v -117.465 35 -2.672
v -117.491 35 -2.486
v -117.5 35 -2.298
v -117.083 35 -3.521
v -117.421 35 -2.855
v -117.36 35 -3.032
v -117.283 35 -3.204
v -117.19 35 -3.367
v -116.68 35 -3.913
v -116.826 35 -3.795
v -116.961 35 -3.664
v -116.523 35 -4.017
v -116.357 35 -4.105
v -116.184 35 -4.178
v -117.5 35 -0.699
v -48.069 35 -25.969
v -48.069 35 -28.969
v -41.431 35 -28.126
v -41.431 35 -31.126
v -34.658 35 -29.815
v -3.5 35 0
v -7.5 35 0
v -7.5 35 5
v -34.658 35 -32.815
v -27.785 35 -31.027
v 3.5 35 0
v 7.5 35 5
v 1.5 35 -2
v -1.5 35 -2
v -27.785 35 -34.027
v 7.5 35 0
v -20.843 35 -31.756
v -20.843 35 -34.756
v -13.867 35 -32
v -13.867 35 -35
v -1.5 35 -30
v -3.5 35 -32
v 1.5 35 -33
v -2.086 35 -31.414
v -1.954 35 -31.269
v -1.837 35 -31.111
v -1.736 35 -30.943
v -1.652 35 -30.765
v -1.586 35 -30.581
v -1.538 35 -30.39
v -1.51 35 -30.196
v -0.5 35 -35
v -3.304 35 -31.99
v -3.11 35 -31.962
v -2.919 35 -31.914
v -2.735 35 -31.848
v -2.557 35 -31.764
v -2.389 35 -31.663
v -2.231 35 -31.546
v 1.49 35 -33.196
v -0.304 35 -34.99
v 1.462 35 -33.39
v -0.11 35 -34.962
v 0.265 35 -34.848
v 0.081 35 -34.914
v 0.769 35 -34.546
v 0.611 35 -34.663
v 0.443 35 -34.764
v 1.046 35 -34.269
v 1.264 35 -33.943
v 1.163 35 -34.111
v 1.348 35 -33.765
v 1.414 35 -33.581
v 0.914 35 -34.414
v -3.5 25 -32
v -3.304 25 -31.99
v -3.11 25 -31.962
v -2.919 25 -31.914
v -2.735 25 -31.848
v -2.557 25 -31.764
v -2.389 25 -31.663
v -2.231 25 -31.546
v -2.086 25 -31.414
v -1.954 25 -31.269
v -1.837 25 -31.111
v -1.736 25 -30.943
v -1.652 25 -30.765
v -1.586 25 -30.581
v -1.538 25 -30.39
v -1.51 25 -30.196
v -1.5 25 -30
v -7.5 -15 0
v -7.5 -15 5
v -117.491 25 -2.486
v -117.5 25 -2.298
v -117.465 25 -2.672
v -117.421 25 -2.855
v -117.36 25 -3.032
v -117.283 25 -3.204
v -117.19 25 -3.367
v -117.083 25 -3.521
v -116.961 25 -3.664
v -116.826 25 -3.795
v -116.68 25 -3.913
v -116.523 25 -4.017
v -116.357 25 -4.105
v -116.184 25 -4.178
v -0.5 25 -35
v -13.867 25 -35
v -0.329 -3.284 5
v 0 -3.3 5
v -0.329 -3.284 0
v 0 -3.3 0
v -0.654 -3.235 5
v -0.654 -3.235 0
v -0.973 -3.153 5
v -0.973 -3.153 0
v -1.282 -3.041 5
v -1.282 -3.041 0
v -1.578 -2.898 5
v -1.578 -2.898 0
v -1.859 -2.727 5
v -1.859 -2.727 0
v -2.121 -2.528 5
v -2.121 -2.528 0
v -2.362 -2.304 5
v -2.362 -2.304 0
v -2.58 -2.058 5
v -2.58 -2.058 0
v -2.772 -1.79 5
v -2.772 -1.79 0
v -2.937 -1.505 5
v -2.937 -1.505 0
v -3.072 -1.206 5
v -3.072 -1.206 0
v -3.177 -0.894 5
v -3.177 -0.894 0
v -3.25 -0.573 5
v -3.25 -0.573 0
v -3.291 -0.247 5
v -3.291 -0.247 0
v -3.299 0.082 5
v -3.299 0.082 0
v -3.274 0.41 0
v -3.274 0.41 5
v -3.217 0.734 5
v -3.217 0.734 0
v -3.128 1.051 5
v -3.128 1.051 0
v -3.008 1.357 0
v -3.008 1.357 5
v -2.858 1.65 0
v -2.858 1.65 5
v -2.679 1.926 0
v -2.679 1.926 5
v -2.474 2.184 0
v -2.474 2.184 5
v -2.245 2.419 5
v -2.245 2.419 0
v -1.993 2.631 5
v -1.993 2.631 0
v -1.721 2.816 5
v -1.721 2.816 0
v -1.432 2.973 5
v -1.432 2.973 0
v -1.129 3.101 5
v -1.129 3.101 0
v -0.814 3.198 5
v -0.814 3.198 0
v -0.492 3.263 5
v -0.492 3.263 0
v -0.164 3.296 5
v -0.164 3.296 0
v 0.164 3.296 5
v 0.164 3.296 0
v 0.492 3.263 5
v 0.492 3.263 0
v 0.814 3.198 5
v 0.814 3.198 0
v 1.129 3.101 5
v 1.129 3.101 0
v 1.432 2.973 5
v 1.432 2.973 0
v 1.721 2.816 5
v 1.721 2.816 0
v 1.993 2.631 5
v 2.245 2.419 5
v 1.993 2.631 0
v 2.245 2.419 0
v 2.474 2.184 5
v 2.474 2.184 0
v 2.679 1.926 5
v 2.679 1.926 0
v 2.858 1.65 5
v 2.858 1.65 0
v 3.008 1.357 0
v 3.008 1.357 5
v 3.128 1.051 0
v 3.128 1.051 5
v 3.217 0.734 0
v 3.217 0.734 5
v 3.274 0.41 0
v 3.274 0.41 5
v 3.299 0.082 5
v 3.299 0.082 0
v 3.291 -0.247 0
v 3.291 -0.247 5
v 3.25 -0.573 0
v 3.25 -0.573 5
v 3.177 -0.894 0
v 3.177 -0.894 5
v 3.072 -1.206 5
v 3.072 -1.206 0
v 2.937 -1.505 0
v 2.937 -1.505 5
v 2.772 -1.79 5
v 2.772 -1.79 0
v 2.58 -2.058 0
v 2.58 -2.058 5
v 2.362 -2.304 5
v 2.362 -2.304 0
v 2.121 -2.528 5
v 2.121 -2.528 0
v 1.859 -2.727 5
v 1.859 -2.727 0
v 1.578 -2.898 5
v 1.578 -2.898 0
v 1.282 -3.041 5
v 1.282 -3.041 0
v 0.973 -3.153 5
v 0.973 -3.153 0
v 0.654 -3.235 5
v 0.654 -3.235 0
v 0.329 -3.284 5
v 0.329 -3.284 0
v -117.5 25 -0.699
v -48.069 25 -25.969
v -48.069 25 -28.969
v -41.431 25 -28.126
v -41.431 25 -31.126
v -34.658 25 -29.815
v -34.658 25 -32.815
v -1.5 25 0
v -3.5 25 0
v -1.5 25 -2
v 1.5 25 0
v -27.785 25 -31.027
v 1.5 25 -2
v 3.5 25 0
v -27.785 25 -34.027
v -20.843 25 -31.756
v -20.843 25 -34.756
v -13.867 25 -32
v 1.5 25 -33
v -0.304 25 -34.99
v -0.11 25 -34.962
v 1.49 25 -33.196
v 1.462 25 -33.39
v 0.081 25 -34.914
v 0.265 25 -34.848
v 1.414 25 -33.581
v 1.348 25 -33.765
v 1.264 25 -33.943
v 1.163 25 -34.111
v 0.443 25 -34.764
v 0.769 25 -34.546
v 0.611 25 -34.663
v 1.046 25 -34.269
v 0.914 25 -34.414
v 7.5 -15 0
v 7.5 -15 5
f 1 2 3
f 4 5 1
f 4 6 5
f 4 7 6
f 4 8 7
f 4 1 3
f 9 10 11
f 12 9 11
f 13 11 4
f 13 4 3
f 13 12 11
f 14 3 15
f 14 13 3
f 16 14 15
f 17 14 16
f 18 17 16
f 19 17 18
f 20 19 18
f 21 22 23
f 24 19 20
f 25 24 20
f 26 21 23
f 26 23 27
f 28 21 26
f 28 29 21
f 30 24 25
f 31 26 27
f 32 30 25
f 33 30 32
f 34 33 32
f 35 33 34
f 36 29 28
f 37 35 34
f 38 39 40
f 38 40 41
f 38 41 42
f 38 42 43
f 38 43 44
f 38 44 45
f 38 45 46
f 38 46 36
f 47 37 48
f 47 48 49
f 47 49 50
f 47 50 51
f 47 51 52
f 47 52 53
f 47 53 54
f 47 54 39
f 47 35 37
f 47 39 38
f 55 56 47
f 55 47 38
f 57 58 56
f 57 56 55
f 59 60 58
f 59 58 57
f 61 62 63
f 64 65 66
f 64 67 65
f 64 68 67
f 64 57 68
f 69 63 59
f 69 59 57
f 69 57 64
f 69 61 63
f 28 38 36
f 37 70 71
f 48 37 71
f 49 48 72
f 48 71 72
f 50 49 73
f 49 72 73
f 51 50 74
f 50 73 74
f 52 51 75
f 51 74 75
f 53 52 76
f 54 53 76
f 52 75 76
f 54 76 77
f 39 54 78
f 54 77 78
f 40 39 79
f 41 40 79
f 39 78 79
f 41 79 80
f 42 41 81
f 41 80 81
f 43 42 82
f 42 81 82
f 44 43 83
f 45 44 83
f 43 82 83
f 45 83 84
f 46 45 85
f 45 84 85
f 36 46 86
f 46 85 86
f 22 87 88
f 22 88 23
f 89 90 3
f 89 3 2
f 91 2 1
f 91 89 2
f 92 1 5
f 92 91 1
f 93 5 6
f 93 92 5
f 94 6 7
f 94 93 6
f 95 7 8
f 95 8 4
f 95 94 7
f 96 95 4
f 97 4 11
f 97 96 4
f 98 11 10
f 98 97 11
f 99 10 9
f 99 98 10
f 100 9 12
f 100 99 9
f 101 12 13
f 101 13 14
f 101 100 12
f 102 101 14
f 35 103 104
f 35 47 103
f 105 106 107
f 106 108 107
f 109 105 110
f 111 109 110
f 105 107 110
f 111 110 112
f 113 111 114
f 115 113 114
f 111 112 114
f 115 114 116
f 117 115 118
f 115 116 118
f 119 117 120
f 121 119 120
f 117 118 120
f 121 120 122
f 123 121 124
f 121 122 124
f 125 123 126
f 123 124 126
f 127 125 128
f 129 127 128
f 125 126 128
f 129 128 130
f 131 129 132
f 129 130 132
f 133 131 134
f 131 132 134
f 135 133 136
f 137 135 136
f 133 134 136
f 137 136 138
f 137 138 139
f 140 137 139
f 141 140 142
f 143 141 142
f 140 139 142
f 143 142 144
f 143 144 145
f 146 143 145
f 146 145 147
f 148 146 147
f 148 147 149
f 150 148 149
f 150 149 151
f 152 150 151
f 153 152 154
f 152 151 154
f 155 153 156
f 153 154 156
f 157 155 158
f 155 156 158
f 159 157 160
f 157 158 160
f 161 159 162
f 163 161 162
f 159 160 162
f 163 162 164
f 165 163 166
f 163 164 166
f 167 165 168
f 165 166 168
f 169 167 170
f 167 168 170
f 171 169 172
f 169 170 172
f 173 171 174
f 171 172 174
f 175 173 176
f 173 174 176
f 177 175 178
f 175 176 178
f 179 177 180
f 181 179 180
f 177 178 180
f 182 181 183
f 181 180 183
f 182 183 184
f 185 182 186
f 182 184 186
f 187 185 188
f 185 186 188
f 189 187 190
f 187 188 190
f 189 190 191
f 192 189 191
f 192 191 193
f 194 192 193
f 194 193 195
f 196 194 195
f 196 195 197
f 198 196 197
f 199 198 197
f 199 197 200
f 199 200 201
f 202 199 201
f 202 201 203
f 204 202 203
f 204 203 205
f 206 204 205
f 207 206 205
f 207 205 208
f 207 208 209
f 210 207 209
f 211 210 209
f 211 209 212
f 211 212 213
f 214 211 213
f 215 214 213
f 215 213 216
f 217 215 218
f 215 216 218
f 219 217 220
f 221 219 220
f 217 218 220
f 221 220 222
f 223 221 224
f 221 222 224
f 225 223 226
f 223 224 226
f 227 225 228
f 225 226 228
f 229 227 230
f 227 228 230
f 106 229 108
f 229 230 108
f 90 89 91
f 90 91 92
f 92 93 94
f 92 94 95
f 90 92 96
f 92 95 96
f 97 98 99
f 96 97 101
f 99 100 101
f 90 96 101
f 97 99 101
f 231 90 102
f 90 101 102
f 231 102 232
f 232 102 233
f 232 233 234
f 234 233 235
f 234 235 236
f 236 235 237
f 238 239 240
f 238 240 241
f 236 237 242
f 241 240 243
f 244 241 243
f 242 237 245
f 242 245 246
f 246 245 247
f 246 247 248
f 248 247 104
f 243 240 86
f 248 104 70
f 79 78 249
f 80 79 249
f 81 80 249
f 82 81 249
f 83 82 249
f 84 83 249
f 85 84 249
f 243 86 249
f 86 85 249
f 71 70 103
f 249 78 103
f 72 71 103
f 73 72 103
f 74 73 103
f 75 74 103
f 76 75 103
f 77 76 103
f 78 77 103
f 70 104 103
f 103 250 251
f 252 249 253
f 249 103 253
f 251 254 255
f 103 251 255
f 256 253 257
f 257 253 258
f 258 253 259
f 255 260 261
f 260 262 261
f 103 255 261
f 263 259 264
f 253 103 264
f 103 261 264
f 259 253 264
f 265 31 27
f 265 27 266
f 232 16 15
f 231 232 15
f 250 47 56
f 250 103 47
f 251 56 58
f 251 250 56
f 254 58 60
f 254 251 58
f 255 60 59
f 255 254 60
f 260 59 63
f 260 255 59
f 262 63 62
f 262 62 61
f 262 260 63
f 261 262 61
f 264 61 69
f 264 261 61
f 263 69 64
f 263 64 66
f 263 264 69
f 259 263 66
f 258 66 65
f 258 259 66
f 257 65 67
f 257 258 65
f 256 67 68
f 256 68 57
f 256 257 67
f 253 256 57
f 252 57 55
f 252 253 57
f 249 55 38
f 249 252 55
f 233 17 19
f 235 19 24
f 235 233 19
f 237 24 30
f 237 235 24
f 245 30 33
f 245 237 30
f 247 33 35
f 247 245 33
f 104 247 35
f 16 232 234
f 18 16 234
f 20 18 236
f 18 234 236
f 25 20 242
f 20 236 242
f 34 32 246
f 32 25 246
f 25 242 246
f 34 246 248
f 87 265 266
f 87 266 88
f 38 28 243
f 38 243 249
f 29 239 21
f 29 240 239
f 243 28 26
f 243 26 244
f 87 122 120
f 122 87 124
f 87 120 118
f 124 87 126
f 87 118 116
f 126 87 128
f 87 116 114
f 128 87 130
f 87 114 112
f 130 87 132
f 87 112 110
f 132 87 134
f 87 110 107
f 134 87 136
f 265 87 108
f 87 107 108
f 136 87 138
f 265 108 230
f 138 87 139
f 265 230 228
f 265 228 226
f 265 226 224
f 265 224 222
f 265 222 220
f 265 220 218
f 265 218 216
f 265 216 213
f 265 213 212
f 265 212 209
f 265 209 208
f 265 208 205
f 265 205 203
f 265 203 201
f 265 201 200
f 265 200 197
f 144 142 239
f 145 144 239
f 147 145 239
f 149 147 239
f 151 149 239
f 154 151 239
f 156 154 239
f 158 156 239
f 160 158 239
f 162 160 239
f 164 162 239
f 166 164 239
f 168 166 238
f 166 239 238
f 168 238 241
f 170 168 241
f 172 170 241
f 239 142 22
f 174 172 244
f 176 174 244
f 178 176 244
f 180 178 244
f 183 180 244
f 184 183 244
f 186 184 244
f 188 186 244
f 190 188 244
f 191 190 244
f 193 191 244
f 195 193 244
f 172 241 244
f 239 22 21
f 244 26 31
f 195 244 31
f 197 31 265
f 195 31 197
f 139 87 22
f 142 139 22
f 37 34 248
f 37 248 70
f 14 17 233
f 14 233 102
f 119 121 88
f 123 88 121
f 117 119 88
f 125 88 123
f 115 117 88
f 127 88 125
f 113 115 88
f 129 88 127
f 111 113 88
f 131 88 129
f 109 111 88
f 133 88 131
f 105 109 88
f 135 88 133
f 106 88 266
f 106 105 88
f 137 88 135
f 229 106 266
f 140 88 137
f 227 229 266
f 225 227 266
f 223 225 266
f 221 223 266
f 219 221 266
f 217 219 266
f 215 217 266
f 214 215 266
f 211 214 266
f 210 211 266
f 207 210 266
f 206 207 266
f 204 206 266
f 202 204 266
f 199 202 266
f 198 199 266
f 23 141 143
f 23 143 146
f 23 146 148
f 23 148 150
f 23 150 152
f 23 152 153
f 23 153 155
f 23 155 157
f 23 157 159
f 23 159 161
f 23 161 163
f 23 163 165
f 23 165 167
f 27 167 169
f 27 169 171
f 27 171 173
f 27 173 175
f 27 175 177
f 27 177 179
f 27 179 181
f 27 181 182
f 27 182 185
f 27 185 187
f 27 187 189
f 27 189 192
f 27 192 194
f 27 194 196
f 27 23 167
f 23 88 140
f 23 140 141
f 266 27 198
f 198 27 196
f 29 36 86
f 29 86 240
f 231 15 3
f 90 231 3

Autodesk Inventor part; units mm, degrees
ref_plane "YZ Plane" through (0, 0, 0) normal (1, 0, 0) x (0, 1, 0)
ref_plane "XZ Plane" through (0, 0, 0) normal (0, 1, 0) x (-1, 0, 0)
ref_plane "XY Plane" through (0, 0, 0) normal (0, 0, 1) x (1, 0, 0)
sketch "Náčrt1" plane through (0, 0, 0) normal (0, 0, 1) x (1, 0, 0)
  line L0 (0, 21) -> (0, -21) projected
  line L1 (-10.5, 0) -> (10.5, 0) projected
  line L2 (-7.5, 15) -> (7.5, 15)
  line L3 (7.5, 15) -> (7.5, -15)
  line L4 (7.5, -15) -> (-7.5, -15)
  line L5 (-7.5, -15) -> (-7.5, 15)
  point P0 (0, 0)
  dimension "d0" = 15
  dimension "d1" = 30
extrude "Vysunutí1" add sketch "Náčrt1" along normal blind 5
sketch "Náčrt2" plane through (-7.5, 15, 0) normal (0, 1, 0) x (1, 0, 0)
  line L0 (7.5, 1) -> (7.5, -6) projected
  line L1 (18, 0) -> (-3, 0) projected
  line L2 (15, 0) -> (0, 0) projected
  line L3 (0, 0) -> (0, -5) projected
  line L4 (15, -5) -> (0, -5) projected
  line L5 (15, 0) -> (15, -5) projected
  line L6 (15, 0) -> (0, 0) projected
  line L7 (0, 0) -> (15, 0)
  line L8 (15, 0) -> (15, -5)
  line L9 (15, -5) -> (0, -5)
  line L10 (0, -5) -> (0, 0)
  point P0 (7.5, 0)
extrude "Vysunutí2" add sketch "Náčrt2" along normal blind 20
sketch "Náčrt3" plane through (0, 0, 5) normal (0, 0, 1) x (1, 0, 0)
  line L0 (-7.5, -15) -> (7.5, -15) projected
  line L1 (7.5, -15) -> (7.5, 35) projected
  line L2 (-7.5, 35) -> (7.5, 35) projected
  line L3 (-7.5, -15) -> (-7.5, 35) projected
  line L4 (0, 45) -> (0, -25) projected
  line L5 (-10.5, 0) -> (10.5, 0) projected
  point P0 (0, 0)
  point P1 (0, 0)
  dimension "d6" = 15
hole "Díra1" at (0, 0, 5) direction (0, 0, -1) diameter 6.6 end through all
sketch "Náčrt4" plane through (-7.5, 35, 0) normal (0, 1, 0) x (1, 0, 0)
  line L0 (15, -5) -> (15, 0) projected
  line L1 (15, 0) -> (0, 0) projected
  line L2 (0, 0) -> (0, -5) projected
  line L3 (0, -5) -> (15, -5) projected
  line L4 (6, 0) -> (9, 0)
  line L5 (9, 0) -> (9, 35)
  line L6 (9, 35) -> (6, 35)
  line L7 (6, 35) -> (6, 0)
  line L8 (7.5, 43) -> (7.5, -13) projected
  line L9 (6, 35) -> (-24, 35)
  line L10 (-24, 35) -> (-24, 32)
  line L11 (-24, 32) -> (6, 32)
  line L12 (6, 32) -> (6, 35)
  line L13 (-24, 35) -> (-110, 3.6986)
  line L14 (-24, 32) -> (-110, 0.6986)
  line L15 (-110, 0.6986) -> (-110, 3.6986)
  point P0 (7.5, 0)
  point P1 (6, 32)
  dimension "d14" = 3
  dimension "d15" = 35
  dimension "d16" = 3
  dimension "d17" = 30
  dimension "d19" = 160
  dimension "d20" = 110
extrude "Vysunutí3" add sketch "Náčrt4" against normal blind 10 contours L1 L8 L6 L5 | L1 L7 L6 L8 | L11 L10 L9 L7 | L14 L15 L13 L10
chamfer "Zkosení1" distance 2 distance2 2 2 edges at (-1.5, 30, 0) (1.5, 30, 0) measured on face at (-6.092, 6.7993, 0)
fillet "Zaoblení2" radius 2 1 edges at (-117.5, 30, -3.6986)
fillet "Zaoblení3" radius 2 2 edges at (1.5, 30, -35) (-1.5, 30, -32)
fillet "Zaoblení4" radius 100 2 edges at (-31.5, 30, -32) (-31.5, 30, -35)
properties part number "srovnavac_3D tisk"
